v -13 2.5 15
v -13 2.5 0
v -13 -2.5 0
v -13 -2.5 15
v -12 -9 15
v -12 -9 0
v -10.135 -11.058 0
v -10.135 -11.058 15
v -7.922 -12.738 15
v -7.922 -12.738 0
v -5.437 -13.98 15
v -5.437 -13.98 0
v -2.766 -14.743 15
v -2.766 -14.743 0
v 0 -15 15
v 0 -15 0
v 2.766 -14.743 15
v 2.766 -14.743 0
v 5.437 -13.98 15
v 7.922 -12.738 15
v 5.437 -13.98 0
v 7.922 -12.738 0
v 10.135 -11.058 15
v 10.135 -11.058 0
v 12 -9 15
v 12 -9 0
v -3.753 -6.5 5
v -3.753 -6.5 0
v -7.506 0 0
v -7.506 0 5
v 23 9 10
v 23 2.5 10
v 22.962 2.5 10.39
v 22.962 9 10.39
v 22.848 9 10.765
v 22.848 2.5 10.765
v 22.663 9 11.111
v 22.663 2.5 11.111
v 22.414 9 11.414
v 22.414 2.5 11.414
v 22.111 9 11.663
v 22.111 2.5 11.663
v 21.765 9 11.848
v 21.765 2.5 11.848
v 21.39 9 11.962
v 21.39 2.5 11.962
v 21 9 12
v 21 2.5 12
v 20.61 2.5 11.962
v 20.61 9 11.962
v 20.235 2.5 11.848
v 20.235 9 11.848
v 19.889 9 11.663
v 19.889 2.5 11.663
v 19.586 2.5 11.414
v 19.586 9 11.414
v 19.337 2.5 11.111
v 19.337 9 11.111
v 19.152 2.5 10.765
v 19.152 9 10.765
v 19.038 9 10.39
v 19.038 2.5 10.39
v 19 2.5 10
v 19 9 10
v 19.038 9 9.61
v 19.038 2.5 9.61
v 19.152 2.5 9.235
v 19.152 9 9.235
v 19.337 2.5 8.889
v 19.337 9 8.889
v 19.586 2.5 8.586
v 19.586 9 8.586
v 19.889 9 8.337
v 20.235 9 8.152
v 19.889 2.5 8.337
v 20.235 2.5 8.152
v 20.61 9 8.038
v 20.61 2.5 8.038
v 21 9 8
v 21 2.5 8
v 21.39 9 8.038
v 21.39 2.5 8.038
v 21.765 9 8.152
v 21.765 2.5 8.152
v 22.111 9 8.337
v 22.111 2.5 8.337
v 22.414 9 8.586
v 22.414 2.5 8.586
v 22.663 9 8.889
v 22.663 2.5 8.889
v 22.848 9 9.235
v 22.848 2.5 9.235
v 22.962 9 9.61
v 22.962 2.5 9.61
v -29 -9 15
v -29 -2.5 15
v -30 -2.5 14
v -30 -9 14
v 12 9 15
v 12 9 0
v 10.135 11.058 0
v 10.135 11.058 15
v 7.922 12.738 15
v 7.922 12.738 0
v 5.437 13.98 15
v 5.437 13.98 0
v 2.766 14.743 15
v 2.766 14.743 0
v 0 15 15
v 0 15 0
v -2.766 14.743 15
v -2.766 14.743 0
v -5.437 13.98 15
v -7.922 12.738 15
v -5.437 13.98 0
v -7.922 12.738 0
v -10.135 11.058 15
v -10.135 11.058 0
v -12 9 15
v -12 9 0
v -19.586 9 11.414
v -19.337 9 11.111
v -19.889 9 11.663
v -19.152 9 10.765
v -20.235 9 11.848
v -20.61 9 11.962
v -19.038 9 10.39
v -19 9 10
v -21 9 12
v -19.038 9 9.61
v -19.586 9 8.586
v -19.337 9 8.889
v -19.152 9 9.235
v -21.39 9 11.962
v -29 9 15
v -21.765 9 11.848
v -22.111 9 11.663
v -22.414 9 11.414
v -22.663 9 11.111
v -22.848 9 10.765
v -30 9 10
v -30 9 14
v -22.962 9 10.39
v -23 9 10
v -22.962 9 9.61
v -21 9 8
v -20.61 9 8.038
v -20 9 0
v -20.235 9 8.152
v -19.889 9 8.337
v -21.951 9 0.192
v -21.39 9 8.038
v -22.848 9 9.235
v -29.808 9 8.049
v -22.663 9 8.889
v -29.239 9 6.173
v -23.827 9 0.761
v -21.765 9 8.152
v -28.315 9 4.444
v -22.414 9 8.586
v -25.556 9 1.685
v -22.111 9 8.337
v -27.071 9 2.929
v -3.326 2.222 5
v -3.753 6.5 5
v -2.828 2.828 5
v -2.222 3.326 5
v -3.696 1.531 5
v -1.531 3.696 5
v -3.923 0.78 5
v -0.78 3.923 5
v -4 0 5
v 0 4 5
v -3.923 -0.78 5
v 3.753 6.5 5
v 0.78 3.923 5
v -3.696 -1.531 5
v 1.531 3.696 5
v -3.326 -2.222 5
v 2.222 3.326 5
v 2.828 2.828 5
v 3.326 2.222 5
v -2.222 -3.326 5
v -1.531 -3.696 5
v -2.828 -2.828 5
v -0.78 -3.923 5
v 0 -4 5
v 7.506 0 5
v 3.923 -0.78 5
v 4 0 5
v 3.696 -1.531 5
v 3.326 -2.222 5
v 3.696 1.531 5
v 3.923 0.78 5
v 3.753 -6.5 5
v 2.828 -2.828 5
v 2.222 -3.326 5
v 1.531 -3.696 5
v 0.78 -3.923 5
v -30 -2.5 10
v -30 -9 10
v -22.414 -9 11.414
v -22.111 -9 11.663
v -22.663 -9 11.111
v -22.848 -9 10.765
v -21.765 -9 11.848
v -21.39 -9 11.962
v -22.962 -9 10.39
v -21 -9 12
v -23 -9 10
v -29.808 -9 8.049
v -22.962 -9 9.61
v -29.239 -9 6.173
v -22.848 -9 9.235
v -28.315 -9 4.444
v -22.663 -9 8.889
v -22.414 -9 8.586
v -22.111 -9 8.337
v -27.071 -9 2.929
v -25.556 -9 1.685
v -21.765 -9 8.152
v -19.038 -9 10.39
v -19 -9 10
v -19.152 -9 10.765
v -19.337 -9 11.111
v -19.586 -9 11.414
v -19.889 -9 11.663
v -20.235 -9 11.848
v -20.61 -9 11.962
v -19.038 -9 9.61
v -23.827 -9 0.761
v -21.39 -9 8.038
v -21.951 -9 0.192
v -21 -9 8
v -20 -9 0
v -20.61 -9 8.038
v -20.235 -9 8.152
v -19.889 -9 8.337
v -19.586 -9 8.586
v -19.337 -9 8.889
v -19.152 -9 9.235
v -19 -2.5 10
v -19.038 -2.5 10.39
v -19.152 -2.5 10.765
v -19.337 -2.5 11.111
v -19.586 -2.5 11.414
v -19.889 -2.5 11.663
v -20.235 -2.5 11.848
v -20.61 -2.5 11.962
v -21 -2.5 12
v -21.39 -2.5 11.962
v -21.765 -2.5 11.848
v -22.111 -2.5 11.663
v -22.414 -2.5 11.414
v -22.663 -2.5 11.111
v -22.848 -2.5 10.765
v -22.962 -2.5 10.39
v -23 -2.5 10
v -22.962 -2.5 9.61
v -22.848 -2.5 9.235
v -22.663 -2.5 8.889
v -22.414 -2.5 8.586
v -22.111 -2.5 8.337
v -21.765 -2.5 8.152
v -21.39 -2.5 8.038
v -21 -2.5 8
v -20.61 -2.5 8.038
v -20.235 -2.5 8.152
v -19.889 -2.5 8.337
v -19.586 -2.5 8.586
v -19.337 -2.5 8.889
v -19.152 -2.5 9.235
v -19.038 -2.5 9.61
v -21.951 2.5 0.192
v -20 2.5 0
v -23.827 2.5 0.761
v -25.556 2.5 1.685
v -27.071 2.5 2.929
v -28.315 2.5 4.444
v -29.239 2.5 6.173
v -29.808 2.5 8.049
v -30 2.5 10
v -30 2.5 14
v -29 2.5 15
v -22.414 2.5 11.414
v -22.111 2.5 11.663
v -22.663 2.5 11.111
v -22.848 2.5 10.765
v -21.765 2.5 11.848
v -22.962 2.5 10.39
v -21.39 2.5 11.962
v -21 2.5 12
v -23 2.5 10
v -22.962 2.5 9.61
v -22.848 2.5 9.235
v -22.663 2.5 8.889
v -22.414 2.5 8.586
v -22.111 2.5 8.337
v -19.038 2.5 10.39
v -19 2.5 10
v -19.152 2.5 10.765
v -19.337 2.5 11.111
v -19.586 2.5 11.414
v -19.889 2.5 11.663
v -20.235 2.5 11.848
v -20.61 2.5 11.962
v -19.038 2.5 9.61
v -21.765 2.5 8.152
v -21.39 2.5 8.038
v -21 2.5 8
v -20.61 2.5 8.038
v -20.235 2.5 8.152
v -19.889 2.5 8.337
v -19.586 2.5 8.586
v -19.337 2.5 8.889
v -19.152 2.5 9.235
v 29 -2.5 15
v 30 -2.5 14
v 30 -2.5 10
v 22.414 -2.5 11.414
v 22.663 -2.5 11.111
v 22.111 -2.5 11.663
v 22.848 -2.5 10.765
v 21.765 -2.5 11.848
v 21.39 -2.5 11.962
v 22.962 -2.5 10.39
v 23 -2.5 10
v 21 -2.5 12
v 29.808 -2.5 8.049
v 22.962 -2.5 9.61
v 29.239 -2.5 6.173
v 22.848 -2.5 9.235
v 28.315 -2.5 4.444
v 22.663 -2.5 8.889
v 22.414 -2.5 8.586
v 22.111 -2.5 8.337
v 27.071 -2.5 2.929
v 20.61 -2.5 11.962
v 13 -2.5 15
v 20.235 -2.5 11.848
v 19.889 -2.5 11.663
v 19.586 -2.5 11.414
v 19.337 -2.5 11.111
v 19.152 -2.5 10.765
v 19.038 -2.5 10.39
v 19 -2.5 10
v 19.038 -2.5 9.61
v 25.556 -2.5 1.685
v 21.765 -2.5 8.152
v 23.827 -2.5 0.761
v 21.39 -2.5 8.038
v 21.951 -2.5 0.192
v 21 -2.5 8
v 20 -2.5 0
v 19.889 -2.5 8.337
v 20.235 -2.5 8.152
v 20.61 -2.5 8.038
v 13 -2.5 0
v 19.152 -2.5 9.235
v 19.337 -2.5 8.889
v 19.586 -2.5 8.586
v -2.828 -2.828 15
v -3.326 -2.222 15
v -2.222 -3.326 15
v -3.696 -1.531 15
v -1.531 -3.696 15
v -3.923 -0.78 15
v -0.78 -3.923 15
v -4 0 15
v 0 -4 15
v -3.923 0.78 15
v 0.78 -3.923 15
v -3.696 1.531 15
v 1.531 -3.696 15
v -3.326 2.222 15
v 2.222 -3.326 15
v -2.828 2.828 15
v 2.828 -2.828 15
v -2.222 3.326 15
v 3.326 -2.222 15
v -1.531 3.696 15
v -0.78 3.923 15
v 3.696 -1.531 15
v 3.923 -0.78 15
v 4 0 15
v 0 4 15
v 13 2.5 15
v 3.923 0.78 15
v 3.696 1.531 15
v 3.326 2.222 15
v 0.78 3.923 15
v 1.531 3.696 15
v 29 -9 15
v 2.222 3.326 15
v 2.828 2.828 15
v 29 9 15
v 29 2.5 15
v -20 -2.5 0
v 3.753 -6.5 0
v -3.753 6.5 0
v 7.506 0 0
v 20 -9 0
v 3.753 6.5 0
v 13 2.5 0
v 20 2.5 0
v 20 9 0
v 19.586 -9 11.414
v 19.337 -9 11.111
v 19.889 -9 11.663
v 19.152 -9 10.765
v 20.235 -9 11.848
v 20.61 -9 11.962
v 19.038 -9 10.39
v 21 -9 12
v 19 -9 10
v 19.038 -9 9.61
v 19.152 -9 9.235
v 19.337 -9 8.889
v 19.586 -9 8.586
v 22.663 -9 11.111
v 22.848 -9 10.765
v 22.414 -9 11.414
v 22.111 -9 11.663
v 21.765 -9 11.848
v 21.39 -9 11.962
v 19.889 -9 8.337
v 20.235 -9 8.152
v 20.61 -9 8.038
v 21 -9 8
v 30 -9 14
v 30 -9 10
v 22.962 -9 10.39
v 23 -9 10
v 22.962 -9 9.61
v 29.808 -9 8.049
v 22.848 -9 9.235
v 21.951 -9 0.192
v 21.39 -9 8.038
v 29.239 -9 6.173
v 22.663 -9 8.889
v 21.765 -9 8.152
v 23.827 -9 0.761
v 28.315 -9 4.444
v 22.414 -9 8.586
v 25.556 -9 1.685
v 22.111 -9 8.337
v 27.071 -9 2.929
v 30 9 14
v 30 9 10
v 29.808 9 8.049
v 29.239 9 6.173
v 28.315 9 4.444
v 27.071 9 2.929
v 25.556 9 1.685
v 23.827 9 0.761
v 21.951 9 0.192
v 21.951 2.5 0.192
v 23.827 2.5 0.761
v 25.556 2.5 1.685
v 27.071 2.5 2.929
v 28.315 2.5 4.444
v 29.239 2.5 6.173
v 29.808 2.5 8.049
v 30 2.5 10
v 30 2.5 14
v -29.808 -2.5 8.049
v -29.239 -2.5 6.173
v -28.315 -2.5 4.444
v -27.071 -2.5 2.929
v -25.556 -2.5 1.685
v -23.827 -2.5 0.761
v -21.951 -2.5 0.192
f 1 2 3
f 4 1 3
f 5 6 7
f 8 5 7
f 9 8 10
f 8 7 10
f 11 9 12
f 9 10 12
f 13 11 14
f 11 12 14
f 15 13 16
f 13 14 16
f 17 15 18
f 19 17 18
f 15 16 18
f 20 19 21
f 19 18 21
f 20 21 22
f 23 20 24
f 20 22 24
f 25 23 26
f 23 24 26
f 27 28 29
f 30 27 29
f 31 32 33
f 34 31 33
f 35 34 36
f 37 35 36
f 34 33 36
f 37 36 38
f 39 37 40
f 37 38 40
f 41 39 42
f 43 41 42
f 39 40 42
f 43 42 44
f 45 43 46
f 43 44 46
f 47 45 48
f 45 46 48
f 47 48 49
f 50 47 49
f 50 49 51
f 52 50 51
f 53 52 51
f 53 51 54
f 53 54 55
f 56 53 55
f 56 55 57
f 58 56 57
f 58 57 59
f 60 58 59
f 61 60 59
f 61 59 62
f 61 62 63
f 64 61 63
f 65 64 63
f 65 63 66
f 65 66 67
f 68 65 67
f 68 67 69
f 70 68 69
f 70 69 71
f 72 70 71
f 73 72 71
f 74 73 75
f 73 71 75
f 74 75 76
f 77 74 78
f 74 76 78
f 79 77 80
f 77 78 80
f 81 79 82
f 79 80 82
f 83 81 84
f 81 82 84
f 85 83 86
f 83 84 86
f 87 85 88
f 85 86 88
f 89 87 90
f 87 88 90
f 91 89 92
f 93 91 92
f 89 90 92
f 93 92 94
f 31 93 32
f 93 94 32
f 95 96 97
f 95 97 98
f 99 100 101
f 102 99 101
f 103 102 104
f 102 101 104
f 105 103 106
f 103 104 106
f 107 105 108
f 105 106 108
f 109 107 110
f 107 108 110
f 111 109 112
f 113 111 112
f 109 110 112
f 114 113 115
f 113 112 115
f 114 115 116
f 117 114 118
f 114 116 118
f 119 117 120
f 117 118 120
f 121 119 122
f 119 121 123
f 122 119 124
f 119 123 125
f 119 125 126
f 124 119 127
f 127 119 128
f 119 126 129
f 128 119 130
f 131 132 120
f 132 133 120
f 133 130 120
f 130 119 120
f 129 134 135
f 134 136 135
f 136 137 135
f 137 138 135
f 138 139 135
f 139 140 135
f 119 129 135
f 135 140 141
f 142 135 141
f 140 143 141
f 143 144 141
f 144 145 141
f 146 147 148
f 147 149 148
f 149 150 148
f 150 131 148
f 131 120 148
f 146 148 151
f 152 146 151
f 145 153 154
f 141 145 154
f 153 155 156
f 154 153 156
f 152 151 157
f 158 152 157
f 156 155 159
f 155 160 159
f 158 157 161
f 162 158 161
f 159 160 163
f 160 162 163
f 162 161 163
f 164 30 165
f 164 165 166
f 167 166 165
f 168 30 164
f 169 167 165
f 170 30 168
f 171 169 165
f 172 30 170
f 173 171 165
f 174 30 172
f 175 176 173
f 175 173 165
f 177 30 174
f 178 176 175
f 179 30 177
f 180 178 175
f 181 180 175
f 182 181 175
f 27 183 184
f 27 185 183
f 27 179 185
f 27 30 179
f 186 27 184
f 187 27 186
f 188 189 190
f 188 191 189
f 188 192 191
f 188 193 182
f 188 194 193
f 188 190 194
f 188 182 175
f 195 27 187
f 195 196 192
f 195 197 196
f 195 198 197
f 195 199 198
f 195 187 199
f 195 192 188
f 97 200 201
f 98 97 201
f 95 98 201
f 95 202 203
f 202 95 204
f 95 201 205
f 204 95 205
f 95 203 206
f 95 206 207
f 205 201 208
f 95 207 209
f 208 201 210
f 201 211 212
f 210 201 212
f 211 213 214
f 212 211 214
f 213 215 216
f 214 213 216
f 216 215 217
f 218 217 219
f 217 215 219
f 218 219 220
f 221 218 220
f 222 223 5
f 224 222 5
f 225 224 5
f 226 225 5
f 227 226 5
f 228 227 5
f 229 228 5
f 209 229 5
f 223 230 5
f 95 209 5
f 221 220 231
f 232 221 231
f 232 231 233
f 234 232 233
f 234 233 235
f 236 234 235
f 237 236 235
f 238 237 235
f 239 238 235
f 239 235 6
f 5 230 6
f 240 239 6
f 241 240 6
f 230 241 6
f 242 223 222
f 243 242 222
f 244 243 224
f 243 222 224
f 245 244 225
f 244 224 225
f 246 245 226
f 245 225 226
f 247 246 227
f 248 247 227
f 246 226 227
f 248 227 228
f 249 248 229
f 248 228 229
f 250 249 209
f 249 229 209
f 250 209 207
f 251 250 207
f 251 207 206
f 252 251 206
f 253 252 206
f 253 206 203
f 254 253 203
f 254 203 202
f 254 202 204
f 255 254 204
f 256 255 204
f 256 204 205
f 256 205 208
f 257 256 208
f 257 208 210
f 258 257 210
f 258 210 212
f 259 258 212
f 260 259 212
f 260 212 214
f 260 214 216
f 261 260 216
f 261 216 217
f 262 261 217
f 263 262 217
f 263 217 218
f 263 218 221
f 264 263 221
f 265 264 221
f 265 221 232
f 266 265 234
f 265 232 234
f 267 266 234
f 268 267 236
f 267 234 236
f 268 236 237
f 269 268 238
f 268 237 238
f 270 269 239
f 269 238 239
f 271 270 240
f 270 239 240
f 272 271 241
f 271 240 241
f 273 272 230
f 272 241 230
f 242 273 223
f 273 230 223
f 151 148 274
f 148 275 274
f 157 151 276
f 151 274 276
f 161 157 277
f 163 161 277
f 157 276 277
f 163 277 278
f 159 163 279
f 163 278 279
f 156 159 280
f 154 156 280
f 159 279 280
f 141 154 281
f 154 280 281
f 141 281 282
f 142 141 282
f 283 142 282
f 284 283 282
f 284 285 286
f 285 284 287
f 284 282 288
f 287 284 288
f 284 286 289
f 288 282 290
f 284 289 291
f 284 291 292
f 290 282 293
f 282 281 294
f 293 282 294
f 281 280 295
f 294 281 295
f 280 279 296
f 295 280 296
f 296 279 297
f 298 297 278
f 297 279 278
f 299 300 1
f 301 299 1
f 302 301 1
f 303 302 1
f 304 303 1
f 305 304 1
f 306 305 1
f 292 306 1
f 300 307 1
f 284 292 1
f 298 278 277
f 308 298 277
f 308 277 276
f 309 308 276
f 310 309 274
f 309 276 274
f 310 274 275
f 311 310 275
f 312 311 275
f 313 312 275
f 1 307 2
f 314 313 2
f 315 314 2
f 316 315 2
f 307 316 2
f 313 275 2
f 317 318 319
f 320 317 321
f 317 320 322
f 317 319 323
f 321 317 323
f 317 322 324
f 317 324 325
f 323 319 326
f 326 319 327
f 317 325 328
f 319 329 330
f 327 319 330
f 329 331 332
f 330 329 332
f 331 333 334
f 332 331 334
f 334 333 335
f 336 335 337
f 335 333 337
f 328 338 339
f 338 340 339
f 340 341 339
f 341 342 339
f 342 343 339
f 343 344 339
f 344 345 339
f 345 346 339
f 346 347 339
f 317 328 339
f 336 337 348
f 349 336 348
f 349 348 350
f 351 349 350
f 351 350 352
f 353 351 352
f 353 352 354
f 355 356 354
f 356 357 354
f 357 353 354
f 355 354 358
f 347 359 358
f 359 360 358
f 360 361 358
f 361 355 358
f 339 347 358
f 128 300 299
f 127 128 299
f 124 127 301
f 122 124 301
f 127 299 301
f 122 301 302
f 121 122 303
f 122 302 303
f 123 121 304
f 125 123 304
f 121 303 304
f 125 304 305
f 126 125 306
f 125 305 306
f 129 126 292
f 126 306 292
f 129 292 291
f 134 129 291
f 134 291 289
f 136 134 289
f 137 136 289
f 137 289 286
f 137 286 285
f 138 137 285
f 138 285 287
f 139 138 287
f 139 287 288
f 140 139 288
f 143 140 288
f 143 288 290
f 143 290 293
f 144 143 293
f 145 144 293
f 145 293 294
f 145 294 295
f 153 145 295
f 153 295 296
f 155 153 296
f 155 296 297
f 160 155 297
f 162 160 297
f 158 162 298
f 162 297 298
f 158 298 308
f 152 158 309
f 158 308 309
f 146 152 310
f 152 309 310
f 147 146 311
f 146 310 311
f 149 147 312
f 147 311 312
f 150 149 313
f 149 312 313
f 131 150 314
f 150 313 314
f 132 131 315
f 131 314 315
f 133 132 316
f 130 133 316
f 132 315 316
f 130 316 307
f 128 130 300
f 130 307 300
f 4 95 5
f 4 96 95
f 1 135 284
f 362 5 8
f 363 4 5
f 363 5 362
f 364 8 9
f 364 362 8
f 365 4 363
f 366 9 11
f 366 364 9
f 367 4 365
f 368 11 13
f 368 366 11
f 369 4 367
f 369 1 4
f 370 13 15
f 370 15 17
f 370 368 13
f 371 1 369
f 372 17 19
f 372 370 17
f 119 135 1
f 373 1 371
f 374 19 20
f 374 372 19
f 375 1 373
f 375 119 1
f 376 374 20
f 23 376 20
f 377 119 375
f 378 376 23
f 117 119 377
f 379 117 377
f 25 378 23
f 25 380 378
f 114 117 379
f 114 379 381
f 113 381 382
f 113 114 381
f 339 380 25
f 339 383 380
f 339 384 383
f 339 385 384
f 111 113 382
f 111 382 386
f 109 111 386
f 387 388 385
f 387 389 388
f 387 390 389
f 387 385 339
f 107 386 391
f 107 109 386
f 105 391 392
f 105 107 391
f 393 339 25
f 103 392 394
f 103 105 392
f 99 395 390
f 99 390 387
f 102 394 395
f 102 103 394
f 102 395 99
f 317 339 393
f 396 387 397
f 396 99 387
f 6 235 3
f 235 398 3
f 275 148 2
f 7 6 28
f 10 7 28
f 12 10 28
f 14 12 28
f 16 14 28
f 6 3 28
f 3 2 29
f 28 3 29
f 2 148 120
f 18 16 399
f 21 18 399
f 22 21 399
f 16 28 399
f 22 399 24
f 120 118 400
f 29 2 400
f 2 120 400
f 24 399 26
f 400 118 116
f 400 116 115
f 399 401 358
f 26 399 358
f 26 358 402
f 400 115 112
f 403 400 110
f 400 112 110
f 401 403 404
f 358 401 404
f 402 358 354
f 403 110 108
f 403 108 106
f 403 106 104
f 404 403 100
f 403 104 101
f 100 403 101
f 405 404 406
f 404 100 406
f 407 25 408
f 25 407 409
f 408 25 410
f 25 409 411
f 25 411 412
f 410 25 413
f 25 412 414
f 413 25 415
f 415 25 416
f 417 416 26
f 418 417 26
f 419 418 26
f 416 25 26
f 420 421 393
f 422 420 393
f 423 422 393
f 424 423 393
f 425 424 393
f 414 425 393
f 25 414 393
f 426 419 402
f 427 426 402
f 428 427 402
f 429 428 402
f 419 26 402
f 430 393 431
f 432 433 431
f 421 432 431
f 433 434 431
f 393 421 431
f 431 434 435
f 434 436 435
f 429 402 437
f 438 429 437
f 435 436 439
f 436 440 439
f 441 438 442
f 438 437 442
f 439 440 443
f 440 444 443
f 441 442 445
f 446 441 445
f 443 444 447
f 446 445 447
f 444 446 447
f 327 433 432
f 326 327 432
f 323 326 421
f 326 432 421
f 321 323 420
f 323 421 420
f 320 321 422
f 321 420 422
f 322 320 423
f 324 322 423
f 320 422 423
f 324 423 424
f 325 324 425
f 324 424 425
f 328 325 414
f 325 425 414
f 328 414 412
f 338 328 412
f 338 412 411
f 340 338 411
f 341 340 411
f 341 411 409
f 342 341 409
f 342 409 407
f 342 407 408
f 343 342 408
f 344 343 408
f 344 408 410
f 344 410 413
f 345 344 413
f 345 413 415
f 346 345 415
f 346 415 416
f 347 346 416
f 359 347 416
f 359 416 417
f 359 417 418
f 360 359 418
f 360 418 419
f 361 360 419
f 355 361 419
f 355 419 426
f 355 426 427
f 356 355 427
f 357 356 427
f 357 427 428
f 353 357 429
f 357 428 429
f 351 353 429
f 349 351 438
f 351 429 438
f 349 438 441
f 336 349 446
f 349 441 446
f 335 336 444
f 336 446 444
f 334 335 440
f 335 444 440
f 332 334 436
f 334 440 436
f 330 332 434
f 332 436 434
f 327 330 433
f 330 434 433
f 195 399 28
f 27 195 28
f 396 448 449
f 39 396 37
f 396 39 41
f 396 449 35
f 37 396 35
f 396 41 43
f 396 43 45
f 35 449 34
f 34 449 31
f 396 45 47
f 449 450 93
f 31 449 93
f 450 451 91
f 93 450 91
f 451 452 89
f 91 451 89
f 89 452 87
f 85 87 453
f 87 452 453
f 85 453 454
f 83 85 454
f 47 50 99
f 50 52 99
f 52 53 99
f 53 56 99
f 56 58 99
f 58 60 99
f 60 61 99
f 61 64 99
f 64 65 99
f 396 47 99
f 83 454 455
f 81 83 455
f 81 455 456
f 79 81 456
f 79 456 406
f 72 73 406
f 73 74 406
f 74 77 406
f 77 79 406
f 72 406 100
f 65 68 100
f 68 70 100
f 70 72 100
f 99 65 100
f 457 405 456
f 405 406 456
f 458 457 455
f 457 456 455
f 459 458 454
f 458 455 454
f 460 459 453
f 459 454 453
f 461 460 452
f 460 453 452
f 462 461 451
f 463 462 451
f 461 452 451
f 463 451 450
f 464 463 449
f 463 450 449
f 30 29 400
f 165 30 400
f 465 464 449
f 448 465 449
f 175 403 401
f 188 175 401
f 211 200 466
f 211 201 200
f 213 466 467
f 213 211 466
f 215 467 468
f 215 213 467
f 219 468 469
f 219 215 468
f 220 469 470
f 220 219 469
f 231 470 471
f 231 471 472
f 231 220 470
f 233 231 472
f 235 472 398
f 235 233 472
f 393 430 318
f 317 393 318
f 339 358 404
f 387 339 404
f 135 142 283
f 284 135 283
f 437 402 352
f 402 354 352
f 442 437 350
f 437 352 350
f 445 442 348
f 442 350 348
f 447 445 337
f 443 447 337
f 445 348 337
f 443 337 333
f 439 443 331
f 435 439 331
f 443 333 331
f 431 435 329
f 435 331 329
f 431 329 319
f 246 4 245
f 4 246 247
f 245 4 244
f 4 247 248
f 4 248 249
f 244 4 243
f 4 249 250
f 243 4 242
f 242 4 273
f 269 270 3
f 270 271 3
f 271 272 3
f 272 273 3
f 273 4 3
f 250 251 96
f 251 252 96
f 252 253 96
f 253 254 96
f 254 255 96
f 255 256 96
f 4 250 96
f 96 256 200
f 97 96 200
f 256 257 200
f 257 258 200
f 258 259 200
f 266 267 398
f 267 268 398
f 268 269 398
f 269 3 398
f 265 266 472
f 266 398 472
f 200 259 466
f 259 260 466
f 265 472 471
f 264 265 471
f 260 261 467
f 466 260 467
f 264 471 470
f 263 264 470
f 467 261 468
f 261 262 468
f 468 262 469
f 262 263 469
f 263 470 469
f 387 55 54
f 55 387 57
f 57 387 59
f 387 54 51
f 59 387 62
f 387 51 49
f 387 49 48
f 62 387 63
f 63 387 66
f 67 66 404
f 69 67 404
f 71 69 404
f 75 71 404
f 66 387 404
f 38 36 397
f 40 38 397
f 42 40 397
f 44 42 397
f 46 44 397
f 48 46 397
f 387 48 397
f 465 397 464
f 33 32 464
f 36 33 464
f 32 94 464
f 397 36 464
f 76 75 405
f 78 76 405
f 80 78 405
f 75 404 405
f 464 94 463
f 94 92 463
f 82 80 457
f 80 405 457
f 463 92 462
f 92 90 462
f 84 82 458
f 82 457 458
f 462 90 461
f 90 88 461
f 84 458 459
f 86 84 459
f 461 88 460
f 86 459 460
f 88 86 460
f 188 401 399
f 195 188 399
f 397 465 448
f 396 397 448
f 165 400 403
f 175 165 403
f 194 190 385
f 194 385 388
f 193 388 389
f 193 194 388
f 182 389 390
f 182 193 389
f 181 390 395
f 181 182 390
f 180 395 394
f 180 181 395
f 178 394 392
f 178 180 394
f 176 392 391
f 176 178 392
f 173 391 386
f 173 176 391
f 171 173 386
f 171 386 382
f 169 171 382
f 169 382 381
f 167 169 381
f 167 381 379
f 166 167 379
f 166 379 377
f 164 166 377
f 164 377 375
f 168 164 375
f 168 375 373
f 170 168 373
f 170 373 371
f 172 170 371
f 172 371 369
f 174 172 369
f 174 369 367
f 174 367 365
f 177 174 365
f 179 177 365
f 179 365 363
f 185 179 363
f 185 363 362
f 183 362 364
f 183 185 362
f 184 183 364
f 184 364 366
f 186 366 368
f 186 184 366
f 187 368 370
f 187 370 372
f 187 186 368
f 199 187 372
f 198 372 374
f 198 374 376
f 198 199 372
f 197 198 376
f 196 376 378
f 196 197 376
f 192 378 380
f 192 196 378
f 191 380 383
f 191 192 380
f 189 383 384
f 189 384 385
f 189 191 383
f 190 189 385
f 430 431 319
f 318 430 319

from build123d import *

# Parameters (mm, degrees)
F0_R     = 4
F1_DEPTH = 15
F3_DEPTH = 5
F4_R     = 2
F5_DEPTH = 24.001
F6_R     = 10
F7_SIZE  = 1


with BuildPart() as f1:
    # F0 (on Top) → F1 (new body)
    with BuildSketch(Plane.XY):
        with BuildLine():
            Line((-30, -9), (-12, -9))
            ThreePointArc((-12, -9), (0, -15), (12, -9))
            Line((12, -9), (30, -9))
            Line((30, -9), (30, -2.5))
            Line((30, -2.5), (13, -2.5))
            Line((13, -2.5), (13, 0))
            Line((13, 0), (13, 2.5))
            Line((13, 2.5), (30, 2.5))
            Line((30, 2.5), (30, 9))
            Line((30, 9), (12, 9))
            ThreePointArc((12, 9), (0, 15), (-12, 9))
            Line((-12, 9), (-30, 9))
            Line((-30, 9), (-30, 2.5))
            Line((-30, 2.5), (-13, 2.5))
            Line((-13, 2.5), (-13, 0))
            Line((-13, 0), (-13, -2.5))
            Line((-13, -2.5), (-30, -2.5))
            Line((-30, -2.5), (-30, -9))
        make_face()
        Circle(F0_R, mode=Mode.SUBTRACT)
    extrude(amount=F1_DEPTH)

    # F2 (on face) → F3 (cut)
    with BuildSketch(Plane(origin=(0, 0, 0), x_dir=(1, 0, 0), z_dir=(0, 0, -1))):
        Polygon((3.752777, -6.5), (7.505553, 0), (3.752777, 6.5), (-3.752777, 6.5), (-7.505553, 0), (-3.752777, -6.5), align=None)
    extrude(amount=-F3_DEPTH, mode=Mode.SUBTRACT)

    # F4 (on face) → F5 (cut, through all)
    with BuildSketch(Plane.XZ.offset(9)):
        with Locations((-21, 10)):
            Circle(F4_R)
        with Locations((21, 10)):
            Circle(F4_R)
    extrude(amount=-F5_DEPTH, mode=Mode.SUBTRACT)

    # F6
    f6_edges = [f1.edges().sort_by_distance(p)[0] for p in [
        (-30, -5.75, 0),
        (-30, 5.75, 0),
        (30, -5.75, 0),
        (30, 5.75, 0),
    ]]
    fillet(f6_edges, radius=F6_R)

    # F7
    f7_edges = [f1.edges().sort_by_distance(p)[0] for p in [
        (-30, 5.75, 15),
        (-30, -5.75, 15),
        (30, 5.75, 15),
        (30, -5.75, 15),
    ]]
    chamfer(f7_edges, length=F7_SIZE)


solid = f1.part
